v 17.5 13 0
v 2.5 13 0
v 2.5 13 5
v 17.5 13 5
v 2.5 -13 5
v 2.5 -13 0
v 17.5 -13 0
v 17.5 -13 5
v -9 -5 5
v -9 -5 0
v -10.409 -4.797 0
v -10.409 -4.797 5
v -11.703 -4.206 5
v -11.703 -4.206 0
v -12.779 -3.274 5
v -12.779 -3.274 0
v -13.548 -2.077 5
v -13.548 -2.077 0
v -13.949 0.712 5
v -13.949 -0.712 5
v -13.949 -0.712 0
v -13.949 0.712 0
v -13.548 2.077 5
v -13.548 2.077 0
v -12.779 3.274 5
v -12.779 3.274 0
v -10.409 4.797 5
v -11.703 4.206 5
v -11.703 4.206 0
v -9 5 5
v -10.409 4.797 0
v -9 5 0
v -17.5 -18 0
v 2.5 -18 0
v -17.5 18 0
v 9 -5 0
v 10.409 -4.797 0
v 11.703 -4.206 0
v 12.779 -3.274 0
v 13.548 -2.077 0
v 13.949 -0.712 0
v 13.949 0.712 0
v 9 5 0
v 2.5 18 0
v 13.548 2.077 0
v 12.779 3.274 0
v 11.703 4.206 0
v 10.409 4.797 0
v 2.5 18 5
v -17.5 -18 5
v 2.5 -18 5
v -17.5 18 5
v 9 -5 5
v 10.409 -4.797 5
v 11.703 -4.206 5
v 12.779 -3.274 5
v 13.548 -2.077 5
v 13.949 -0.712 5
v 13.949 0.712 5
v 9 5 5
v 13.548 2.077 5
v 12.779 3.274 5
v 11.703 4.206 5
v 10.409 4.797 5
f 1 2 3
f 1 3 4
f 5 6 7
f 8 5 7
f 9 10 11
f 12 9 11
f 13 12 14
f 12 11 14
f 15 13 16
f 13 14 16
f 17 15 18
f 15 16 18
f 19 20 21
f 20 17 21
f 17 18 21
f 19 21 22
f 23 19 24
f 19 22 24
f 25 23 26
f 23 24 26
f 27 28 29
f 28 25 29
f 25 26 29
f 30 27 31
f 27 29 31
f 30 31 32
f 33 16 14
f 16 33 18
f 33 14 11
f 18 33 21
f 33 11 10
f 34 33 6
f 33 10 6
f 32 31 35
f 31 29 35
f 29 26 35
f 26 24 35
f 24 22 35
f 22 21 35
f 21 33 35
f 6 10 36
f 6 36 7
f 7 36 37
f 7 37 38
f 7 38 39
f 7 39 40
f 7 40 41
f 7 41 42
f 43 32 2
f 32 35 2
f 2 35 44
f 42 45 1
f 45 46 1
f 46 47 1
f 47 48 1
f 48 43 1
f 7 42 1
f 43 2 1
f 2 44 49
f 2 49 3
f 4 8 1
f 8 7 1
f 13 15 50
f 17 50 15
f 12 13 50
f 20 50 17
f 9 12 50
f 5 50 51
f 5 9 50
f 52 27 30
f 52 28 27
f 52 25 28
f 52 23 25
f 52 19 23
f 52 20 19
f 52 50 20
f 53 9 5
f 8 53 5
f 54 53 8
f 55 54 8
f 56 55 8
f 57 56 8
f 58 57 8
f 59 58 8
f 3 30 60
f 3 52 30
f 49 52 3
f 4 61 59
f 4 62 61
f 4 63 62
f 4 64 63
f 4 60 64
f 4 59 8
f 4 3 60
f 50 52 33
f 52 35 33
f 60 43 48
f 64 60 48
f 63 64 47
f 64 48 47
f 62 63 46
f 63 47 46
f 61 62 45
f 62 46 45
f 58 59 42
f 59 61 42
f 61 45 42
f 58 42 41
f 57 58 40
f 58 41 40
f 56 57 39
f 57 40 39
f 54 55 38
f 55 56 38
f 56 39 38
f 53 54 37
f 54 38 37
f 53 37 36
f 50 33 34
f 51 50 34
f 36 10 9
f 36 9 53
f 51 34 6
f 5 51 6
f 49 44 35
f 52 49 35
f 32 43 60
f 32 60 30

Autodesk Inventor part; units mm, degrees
ref_plane "YZ Plane" through (0, 0, 0) normal (1, 0, 0) x (0, 1, 0)
ref_plane "XZ Plane" through (0, 0, 0) normal (0, 1, 0) x (-1, 0, 0)
ref_plane "XY Plane" through (0, 0, 0) normal (0, 0, 1) x (1, 0, 0)
sketch "Sketch1" plane through (0, 0, 0) normal (0, 0, 1) x (1, 0, 0)
  line L0 (-17.5, -18) -> (17.5, -18)
  line L1 (17.5, -18) -> (17.5, 18)
  line L2 (17.5, 18) -> (-17.5, 18)
  line L3 (-17.5, 18) -> (-17.5, -18)
  line L4 (-17.5, -18) -> (17.5, 18) construction
  line L5 (17.5, -18) -> (-17.5, 18) construction
  line L6 (17.5, 18) -> (2.5, 18)
  line L7 (2.5, 18) -> (2.5, 13)
  line L8 (2.5, 13) -> (17.5, 13)
  line L9 (17.5, 13) -> (17.5, 18)
  line L10 (17.5, -18) -> (2.5, -18)
  line L11 (2.5, -18) -> (2.5, -13)
  line L12 (2.5, -13) -> (17.5, -13)
  line L13 (17.5, -13) -> (17.5, -18)
  line L14 (-9, 0) -> (9, 0) construction
  line L15 (-9, -5) -> (9, -5)
  line L16 (9, 5) -> (-9, 5)
  arc A0 (-9, 5) -> (-9, -5) centre (-9, 0) ccw
  arc A1 (9, -5) -> (9, 5) centre (9, 0) ccw
  point P0 (0, 0)
  point P1 (2.5, -18)
  point P2 (17.5, 13)
  point P3 (0, 0)
  point P4 (-17.5, 0)
  dimension "d0" = 36
  dimension "d1" = 35
  dimension "d2" = 5
  dimension "d3" = 5
  dimension "d4" = 20
  dimension "d7" = 10
  dimension "d8" = 18
extrude "Extrusion1" add sketch "Sketch1" along normal blind 5 contours L3 L2 L7 L8 L1 L12 L11 L0
equation "\"d3\" = d2"
properties part number "r-support"
